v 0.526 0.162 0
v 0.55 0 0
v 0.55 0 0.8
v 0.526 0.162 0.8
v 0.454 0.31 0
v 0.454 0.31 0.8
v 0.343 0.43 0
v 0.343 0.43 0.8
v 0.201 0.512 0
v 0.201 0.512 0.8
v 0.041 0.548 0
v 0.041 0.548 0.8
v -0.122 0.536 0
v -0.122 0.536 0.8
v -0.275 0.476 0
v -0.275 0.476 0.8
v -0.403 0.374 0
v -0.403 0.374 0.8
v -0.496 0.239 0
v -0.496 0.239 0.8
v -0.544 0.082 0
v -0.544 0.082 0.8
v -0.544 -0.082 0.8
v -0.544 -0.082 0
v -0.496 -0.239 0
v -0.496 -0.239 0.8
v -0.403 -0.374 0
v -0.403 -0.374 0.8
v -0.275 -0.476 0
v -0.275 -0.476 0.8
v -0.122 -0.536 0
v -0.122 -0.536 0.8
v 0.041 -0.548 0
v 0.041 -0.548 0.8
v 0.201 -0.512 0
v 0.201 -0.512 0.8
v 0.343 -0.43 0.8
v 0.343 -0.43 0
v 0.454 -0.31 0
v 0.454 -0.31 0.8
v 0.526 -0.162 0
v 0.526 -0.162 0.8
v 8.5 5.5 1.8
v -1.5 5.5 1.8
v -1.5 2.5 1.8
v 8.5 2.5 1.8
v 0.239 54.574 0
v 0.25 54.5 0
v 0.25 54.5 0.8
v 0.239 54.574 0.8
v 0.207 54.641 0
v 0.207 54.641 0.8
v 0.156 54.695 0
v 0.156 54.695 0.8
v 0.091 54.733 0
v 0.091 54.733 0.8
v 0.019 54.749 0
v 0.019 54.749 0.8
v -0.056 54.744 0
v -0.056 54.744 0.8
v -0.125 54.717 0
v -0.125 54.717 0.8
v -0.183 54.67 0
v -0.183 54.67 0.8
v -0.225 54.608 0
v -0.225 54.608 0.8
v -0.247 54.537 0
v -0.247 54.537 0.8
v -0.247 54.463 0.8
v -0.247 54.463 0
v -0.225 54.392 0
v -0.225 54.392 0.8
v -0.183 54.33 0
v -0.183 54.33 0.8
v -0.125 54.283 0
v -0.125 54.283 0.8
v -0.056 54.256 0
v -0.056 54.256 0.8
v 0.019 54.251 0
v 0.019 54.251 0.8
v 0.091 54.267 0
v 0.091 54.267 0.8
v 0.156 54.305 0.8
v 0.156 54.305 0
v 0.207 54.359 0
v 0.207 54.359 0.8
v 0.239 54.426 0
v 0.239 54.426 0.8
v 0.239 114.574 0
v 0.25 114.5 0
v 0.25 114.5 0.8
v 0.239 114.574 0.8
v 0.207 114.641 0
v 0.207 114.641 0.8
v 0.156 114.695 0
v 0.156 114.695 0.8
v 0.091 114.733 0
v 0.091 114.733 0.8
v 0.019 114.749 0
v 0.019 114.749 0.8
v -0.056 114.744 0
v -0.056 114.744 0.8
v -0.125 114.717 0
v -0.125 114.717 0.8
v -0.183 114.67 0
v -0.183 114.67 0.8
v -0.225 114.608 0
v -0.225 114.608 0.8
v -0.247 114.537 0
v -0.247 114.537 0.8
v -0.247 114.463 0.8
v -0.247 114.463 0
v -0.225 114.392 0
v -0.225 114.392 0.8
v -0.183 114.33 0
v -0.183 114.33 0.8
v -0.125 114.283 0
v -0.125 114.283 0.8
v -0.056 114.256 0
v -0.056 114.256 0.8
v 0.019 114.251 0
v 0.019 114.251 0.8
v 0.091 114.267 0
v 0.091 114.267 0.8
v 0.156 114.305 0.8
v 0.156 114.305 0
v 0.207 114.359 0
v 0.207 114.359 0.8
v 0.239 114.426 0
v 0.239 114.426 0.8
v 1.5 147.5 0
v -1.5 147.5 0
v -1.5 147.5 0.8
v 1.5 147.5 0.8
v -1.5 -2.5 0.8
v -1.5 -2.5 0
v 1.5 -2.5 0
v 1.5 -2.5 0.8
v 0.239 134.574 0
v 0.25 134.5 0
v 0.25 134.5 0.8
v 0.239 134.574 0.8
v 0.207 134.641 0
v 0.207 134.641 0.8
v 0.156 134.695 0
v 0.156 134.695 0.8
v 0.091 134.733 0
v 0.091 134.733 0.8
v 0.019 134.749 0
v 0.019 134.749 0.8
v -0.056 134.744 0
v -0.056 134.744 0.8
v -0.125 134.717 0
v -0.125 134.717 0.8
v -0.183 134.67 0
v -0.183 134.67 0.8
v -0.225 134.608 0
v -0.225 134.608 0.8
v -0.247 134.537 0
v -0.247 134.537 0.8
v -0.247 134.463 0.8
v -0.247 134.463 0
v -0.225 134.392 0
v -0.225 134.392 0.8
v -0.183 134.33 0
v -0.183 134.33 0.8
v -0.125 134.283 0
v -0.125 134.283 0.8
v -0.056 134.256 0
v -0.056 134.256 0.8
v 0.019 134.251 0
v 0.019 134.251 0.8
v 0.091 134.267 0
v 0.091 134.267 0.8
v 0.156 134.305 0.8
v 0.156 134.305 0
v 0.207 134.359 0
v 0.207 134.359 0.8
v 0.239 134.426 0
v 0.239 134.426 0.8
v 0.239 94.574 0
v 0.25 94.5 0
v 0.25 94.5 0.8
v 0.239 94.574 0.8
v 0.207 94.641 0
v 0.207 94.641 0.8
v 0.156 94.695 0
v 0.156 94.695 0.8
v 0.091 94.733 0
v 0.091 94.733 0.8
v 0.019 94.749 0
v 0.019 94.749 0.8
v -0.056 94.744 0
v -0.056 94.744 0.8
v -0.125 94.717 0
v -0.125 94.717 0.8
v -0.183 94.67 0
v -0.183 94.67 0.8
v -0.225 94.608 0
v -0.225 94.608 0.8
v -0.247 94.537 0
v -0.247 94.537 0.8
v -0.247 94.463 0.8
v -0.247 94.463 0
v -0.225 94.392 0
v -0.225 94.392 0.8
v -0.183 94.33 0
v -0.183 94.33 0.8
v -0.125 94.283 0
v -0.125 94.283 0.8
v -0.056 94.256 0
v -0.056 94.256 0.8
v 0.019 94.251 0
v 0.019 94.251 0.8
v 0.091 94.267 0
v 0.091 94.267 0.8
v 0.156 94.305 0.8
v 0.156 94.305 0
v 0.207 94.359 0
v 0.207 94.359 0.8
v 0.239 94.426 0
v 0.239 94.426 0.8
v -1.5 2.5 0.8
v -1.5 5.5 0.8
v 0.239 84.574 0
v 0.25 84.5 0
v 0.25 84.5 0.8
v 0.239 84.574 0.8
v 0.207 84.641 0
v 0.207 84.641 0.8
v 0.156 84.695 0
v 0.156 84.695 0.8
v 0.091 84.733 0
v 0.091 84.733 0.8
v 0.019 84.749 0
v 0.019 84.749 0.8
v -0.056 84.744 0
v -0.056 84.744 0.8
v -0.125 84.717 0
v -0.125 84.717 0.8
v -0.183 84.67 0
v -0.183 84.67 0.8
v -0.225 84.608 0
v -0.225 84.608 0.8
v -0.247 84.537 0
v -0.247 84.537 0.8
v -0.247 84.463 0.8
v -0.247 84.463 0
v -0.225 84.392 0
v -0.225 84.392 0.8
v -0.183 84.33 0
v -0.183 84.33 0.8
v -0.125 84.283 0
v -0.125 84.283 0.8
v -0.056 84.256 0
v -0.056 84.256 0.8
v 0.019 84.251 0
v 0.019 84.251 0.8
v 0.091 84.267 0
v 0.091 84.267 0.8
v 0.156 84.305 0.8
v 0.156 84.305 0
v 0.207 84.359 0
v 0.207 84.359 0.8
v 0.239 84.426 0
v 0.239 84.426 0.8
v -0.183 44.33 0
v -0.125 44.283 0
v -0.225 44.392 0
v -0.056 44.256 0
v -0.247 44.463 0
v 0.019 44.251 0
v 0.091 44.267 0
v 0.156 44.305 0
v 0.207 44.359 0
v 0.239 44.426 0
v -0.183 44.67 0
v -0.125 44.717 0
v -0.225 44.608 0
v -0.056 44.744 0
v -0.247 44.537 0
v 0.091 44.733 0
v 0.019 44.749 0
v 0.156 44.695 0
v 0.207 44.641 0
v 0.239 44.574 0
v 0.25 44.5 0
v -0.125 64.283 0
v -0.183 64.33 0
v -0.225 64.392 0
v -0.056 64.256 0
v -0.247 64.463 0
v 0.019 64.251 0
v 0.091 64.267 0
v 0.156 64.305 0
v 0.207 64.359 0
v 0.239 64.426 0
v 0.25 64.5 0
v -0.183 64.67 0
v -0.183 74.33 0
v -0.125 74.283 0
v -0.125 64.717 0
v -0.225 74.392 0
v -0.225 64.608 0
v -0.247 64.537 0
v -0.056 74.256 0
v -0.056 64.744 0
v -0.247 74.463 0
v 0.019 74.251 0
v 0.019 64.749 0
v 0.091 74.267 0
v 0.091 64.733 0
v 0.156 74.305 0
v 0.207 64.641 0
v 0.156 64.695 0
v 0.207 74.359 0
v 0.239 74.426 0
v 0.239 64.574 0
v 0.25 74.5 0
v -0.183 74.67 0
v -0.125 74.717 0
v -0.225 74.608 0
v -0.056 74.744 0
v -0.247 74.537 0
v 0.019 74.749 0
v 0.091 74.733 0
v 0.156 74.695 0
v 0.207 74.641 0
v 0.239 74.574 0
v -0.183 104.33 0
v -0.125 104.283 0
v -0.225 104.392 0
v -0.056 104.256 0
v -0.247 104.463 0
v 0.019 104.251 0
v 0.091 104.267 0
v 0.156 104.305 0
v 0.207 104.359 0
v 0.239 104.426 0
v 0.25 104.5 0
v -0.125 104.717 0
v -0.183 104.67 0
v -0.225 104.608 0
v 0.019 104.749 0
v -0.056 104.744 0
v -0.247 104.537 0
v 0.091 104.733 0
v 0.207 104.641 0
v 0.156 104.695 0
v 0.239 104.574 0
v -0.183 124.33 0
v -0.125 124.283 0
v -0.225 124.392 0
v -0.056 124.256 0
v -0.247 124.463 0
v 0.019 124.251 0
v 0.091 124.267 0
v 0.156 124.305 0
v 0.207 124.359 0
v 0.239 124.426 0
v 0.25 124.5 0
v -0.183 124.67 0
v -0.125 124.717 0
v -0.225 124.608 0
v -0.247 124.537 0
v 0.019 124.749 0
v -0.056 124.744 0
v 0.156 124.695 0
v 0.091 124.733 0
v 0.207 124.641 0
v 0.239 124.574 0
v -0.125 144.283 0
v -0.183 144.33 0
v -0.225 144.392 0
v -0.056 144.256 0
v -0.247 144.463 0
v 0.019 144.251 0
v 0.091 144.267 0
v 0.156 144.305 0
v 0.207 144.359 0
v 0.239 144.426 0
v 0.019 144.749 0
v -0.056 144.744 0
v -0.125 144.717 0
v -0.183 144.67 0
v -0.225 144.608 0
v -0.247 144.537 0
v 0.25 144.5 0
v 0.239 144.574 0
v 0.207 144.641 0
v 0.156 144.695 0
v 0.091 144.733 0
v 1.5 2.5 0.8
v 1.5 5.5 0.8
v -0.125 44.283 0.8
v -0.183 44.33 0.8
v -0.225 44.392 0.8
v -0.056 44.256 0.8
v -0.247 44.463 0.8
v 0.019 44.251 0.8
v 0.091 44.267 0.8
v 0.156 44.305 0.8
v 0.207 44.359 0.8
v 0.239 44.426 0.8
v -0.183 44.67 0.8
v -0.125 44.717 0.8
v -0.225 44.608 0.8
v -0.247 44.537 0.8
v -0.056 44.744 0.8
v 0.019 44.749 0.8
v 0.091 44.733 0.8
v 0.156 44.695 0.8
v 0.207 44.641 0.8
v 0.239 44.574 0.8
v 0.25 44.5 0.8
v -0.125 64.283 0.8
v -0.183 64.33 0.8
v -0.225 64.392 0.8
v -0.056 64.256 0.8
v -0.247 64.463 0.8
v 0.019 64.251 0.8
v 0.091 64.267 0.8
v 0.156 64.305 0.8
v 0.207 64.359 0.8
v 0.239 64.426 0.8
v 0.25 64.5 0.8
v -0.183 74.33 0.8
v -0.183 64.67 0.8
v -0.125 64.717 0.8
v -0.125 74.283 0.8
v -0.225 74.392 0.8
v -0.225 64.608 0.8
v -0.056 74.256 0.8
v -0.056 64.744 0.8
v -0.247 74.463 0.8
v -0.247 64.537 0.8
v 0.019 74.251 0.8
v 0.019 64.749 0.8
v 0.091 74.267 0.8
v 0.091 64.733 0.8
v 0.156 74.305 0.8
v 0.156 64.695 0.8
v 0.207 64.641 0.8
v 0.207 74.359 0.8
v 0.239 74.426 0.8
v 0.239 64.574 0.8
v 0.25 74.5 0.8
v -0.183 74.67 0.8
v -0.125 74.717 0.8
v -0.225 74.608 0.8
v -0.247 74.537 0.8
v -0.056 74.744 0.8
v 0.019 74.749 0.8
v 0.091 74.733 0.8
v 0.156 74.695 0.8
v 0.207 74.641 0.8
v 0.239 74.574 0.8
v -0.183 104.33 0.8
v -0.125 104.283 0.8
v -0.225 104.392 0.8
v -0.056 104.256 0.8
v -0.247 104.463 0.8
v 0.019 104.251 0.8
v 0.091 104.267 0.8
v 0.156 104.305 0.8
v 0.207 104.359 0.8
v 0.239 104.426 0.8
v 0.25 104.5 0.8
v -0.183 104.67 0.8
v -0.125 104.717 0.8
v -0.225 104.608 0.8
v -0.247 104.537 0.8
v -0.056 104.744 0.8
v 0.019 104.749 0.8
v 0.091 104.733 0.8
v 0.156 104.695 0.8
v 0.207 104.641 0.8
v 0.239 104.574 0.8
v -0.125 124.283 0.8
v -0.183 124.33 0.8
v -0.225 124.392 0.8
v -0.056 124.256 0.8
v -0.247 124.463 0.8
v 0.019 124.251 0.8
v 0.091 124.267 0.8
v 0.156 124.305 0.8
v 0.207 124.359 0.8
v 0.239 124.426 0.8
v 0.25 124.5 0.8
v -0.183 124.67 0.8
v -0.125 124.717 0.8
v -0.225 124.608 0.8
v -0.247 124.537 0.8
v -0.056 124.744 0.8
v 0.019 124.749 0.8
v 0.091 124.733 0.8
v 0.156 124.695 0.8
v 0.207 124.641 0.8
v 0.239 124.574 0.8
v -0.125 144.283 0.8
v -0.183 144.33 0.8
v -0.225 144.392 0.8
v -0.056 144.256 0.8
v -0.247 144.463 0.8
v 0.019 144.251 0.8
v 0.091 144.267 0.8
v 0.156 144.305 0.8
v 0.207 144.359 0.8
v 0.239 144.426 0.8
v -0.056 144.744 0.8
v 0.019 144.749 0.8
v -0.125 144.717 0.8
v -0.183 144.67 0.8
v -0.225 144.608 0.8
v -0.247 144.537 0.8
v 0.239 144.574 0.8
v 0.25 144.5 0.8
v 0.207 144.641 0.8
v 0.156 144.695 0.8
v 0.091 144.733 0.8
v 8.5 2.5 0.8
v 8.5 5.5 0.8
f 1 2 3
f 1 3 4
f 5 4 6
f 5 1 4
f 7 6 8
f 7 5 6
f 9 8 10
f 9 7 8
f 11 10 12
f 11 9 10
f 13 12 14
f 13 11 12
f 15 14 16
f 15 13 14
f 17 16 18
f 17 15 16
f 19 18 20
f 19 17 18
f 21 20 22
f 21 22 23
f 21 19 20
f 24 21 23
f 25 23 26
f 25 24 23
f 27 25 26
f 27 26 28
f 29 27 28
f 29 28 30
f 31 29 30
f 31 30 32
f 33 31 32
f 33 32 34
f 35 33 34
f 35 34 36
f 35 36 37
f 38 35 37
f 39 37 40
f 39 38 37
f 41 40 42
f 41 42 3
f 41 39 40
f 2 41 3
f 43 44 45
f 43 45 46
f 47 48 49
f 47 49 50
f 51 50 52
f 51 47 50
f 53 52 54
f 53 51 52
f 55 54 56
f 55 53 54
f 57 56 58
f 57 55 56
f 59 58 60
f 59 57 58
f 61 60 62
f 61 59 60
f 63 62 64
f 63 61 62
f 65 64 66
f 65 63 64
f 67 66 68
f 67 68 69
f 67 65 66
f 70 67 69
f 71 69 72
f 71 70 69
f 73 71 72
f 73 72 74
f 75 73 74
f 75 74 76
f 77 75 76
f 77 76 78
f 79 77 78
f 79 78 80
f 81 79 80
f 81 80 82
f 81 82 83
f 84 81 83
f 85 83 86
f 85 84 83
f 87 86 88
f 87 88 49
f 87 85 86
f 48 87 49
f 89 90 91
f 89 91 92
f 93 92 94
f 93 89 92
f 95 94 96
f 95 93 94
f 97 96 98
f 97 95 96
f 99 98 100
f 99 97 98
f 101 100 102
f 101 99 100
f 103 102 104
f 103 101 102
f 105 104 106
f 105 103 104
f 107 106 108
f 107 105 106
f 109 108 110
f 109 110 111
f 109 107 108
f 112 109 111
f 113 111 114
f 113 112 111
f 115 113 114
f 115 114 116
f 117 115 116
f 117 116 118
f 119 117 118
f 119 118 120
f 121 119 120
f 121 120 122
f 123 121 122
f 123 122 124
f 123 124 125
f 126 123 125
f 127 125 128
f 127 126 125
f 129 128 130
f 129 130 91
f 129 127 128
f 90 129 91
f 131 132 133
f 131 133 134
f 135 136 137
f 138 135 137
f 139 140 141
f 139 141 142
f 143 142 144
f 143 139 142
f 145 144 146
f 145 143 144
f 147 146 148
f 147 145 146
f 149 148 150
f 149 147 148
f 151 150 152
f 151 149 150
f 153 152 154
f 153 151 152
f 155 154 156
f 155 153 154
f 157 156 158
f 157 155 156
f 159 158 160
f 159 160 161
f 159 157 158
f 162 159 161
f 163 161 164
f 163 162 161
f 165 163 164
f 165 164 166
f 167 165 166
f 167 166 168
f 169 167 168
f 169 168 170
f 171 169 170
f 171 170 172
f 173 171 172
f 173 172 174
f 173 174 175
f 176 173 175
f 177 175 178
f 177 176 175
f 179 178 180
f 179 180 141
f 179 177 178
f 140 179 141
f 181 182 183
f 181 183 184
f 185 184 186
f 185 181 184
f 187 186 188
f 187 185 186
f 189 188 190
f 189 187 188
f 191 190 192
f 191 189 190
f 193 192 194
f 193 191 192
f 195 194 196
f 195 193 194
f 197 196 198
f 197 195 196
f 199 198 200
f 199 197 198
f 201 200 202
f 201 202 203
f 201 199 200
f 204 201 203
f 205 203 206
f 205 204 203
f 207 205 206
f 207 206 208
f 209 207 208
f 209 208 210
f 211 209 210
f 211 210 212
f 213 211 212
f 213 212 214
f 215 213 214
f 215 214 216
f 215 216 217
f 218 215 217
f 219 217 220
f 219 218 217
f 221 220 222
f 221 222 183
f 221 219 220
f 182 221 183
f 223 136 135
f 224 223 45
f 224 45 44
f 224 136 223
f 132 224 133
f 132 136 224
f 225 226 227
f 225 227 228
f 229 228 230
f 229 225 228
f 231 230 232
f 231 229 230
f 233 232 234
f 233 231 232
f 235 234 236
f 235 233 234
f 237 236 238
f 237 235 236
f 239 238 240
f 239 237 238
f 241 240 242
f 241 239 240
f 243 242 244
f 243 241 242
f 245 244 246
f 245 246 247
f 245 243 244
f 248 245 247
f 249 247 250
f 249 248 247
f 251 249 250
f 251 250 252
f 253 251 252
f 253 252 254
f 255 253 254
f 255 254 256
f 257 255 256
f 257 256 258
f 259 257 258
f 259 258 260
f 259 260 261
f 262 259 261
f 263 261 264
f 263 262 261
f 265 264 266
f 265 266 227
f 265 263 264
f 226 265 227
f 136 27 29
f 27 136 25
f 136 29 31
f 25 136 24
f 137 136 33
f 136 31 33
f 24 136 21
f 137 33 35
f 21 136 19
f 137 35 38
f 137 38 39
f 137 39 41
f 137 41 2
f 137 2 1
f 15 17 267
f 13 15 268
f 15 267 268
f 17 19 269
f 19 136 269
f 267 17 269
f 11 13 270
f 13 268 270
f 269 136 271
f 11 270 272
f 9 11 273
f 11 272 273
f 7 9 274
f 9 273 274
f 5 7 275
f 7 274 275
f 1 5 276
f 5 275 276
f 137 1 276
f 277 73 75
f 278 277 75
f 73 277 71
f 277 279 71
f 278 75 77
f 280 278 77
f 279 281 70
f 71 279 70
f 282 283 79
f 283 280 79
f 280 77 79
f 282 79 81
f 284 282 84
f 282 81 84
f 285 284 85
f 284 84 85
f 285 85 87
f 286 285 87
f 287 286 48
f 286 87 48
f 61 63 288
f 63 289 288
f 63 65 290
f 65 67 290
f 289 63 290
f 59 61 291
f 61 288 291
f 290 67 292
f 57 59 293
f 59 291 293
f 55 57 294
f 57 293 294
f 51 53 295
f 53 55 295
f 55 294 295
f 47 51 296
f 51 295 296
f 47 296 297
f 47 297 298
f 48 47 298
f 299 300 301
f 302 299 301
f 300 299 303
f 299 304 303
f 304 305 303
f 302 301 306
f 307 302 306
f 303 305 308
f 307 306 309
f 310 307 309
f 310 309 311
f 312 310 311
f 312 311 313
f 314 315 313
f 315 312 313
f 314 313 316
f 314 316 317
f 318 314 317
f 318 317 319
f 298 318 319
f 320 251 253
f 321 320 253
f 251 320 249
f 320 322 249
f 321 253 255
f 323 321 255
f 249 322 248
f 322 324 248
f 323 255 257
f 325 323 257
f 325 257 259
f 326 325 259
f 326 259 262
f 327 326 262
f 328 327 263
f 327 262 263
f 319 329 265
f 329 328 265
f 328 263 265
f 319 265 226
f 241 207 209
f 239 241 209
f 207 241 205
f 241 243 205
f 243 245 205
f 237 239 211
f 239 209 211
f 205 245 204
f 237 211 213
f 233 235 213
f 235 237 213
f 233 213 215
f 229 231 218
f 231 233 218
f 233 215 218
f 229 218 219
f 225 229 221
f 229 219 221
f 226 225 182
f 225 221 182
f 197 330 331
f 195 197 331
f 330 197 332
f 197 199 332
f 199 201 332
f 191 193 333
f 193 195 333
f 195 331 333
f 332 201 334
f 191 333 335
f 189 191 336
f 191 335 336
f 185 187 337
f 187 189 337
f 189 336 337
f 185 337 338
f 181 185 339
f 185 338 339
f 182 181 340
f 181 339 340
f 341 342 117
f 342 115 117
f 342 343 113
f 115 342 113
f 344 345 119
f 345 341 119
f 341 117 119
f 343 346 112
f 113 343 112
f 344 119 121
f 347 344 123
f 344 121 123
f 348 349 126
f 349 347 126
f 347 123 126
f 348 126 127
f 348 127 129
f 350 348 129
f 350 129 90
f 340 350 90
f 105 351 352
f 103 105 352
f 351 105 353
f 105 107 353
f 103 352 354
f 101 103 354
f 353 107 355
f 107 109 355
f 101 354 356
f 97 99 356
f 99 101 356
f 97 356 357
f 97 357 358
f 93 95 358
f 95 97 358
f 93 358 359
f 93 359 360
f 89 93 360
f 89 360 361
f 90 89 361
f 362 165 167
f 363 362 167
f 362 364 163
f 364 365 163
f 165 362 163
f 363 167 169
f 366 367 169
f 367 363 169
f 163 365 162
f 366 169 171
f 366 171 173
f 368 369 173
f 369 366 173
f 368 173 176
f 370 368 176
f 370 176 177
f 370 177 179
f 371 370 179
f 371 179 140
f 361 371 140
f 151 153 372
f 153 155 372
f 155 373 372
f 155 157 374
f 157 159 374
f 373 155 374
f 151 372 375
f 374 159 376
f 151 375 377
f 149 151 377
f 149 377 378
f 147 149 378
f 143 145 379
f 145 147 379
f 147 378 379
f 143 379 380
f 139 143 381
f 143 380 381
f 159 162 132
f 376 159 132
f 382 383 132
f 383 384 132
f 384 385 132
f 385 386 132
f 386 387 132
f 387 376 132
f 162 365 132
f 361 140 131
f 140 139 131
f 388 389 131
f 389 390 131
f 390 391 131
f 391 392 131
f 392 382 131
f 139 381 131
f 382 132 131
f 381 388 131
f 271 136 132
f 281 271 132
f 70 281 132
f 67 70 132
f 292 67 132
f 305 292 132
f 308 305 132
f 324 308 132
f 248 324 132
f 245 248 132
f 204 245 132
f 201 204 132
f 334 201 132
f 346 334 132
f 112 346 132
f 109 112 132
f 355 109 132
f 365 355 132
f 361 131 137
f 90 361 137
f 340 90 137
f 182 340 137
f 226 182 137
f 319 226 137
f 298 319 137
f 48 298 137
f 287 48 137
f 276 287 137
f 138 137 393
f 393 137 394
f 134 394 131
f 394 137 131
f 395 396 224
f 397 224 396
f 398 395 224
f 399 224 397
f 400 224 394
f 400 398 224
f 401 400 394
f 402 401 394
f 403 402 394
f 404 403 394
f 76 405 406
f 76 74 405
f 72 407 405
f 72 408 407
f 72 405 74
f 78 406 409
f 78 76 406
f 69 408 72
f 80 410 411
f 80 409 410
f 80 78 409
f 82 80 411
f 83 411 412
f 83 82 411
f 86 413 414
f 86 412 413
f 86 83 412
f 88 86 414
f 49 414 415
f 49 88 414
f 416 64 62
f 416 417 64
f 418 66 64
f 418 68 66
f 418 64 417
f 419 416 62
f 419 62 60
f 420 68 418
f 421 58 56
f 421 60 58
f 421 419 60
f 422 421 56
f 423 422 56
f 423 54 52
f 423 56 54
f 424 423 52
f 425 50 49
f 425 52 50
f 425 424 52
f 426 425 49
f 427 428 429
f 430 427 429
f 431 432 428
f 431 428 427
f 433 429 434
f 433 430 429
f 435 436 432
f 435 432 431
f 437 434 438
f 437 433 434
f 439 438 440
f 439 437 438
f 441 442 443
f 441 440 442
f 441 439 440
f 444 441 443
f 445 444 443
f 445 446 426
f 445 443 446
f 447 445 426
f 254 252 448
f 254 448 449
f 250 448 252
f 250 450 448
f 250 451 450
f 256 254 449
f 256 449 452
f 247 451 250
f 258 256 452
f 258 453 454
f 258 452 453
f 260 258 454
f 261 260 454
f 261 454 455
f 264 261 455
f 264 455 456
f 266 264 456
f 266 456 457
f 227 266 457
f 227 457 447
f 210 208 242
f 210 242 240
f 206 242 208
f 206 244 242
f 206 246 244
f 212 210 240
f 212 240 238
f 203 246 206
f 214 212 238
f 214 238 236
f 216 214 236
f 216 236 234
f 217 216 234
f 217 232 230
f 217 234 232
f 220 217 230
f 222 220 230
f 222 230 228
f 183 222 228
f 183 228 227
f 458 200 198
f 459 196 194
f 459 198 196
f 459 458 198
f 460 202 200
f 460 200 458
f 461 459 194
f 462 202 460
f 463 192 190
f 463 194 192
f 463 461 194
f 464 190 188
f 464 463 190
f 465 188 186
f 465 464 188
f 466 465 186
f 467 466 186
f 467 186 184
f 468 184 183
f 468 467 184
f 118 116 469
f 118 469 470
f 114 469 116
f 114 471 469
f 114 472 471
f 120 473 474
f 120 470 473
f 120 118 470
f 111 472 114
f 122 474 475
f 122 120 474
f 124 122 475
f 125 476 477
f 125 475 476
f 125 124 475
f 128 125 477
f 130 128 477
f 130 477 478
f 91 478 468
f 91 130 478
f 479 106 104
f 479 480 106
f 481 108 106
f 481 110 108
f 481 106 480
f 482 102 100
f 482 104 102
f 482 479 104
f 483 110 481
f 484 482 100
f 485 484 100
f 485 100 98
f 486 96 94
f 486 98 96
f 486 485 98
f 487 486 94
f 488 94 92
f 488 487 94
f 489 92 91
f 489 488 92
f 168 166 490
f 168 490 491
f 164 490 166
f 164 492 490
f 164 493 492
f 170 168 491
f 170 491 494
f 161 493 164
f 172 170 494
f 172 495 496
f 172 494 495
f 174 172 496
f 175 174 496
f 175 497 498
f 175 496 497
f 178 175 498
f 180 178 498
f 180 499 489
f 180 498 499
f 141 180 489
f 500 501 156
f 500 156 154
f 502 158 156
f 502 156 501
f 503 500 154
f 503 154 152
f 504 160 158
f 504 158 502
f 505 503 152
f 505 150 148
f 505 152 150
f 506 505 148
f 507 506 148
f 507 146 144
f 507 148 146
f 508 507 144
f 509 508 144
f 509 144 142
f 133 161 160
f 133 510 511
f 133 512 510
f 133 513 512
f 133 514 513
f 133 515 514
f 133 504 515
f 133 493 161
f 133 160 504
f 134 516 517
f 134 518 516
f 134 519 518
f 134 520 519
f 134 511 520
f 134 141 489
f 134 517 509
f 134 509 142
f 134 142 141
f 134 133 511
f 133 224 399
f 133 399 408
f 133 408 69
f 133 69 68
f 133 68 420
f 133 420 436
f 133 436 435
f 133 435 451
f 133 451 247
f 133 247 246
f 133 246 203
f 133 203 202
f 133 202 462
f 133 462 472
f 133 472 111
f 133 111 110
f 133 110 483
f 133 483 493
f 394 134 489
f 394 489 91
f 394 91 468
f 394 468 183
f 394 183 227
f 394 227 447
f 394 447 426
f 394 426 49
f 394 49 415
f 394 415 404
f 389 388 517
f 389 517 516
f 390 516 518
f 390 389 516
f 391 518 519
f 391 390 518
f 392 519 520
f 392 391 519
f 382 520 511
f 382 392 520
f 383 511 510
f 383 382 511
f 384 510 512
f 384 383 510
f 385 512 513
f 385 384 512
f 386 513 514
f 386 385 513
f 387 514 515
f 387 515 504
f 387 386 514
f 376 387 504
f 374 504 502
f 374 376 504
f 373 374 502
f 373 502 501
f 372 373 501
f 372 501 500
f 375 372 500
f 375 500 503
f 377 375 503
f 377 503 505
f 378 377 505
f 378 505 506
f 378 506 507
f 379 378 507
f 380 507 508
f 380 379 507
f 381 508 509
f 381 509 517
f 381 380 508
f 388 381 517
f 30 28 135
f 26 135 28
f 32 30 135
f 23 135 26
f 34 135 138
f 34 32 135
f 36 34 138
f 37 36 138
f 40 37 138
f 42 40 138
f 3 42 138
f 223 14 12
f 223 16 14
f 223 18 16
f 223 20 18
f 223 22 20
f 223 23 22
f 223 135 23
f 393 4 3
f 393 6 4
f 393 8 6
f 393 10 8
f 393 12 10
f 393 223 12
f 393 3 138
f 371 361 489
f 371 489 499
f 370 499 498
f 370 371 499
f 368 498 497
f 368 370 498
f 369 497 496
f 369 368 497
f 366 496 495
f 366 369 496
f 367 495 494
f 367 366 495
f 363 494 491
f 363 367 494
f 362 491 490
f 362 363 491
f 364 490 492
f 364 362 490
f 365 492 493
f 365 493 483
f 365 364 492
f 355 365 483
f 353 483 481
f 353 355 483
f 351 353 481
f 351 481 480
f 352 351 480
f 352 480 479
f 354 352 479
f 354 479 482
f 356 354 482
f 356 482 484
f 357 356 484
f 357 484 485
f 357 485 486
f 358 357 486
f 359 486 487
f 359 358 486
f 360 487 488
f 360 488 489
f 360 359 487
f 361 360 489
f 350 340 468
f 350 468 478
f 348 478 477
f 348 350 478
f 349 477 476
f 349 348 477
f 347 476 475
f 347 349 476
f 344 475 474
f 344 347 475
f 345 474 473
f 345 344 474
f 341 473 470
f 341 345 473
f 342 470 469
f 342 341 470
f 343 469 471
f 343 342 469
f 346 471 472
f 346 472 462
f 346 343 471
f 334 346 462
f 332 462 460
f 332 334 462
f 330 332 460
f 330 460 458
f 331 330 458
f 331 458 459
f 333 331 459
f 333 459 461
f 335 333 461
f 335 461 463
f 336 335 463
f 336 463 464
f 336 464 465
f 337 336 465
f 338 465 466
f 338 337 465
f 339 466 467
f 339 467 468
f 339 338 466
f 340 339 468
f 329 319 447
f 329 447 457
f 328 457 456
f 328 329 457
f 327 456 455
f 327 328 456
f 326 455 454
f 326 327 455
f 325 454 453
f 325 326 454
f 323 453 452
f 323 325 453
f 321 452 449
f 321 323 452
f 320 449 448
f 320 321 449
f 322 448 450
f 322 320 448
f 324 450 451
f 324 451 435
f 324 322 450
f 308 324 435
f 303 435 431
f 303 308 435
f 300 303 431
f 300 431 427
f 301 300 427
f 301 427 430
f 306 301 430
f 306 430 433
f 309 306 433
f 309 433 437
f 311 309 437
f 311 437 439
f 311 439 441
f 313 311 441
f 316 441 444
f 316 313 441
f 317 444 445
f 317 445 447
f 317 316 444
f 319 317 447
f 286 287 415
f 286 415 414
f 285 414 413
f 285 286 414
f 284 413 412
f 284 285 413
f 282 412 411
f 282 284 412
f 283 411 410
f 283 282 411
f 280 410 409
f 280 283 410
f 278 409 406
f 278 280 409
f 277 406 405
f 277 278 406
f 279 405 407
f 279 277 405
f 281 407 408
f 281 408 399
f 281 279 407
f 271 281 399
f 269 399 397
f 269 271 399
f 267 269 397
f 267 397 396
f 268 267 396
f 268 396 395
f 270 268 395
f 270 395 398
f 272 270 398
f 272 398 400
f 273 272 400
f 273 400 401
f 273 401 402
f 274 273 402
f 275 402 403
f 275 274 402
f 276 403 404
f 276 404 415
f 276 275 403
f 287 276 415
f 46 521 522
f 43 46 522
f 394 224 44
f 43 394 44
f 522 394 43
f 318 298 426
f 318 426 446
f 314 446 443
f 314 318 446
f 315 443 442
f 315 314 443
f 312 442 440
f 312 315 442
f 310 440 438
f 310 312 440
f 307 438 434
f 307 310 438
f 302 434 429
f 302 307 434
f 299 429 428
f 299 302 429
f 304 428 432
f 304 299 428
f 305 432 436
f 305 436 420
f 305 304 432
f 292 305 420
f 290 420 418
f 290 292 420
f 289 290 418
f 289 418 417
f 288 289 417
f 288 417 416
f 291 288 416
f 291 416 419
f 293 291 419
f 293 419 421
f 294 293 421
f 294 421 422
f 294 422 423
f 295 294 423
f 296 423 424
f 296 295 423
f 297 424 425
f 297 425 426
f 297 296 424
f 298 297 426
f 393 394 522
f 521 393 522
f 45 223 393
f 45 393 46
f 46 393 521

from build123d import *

# Parameters (mm, degrees)
SKETCH1_W           = 3
SKETCH1_H           = 150
SKETCH1_R           = 0.55
SKETCH1_R_2         = 0.25
BOSS_EXTRUDE3_DEPTH = 0.8
SKETCH2_W           = 10
SKETCH2_H           = 3
BOSS_EXTRUDE4_DEPTH = 1


with BuildPart() as part:
    # Sketch1 → Boss-Extrude3 (new body)
    with BuildSketch(Plane.XY):
        with Locations((0, 72.5)):
            Rectangle(SKETCH1_W, SKETCH1_H)
        Circle(SKETCH1_R, mode=Mode.SUBTRACT)
        with Locations((0, 144.5)):
            Circle(SKETCH1_R_2, mode=Mode.SUBTRACT)
        with Locations((0, 134.5)):
            Circle(SKETCH1_R_2, mode=Mode.SUBTRACT)
        with Locations((0, 124.5)):
            Circle(SKETCH1_R_2, mode=Mode.SUBTRACT)
        with Locations((0, 114.5)):
            Circle(SKETCH1_R_2, mode=Mode.SUBTRACT)
        with Locations((0, 104.5)):
            Circle(SKETCH1_R_2, mode=Mode.SUBTRACT)
        with Locations((0, 64.5)):
            Circle(SKETCH1_R_2, mode=Mode.SUBTRACT)
        with Locations((0, 54.5)):
            Circle(SKETCH1_R_2, mode=Mode.SUBTRACT)
        with Locations((0, 94.5)):
            Circle(SKETCH1_R_2, mode=Mode.SUBTRACT)
        with Locations((0, 84.5)):
            Circle(SKETCH1_R_2, mode=Mode.SUBTRACT)
        with Locations((0, 74.5)):
            Circle(SKETCH1_R_2, mode=Mode.SUBTRACT)
        with Locations((0, 44.5)):
            Circle(SKETCH1_R_2, mode=Mode.SUBTRACT)
    extrude(amount=BOSS_EXTRUDE3_DEPTH)

    # Sketch2 → Boss-Extrude4 (add)
    with BuildSketch(Plane.XY.offset(0.8)):
        with Locations((3.5, 4)):
            Rectangle(SKETCH2_W, SKETCH2_H)
    extrude(amount=BOSS_EXTRUDE4_DEPTH)


solid = part.part
